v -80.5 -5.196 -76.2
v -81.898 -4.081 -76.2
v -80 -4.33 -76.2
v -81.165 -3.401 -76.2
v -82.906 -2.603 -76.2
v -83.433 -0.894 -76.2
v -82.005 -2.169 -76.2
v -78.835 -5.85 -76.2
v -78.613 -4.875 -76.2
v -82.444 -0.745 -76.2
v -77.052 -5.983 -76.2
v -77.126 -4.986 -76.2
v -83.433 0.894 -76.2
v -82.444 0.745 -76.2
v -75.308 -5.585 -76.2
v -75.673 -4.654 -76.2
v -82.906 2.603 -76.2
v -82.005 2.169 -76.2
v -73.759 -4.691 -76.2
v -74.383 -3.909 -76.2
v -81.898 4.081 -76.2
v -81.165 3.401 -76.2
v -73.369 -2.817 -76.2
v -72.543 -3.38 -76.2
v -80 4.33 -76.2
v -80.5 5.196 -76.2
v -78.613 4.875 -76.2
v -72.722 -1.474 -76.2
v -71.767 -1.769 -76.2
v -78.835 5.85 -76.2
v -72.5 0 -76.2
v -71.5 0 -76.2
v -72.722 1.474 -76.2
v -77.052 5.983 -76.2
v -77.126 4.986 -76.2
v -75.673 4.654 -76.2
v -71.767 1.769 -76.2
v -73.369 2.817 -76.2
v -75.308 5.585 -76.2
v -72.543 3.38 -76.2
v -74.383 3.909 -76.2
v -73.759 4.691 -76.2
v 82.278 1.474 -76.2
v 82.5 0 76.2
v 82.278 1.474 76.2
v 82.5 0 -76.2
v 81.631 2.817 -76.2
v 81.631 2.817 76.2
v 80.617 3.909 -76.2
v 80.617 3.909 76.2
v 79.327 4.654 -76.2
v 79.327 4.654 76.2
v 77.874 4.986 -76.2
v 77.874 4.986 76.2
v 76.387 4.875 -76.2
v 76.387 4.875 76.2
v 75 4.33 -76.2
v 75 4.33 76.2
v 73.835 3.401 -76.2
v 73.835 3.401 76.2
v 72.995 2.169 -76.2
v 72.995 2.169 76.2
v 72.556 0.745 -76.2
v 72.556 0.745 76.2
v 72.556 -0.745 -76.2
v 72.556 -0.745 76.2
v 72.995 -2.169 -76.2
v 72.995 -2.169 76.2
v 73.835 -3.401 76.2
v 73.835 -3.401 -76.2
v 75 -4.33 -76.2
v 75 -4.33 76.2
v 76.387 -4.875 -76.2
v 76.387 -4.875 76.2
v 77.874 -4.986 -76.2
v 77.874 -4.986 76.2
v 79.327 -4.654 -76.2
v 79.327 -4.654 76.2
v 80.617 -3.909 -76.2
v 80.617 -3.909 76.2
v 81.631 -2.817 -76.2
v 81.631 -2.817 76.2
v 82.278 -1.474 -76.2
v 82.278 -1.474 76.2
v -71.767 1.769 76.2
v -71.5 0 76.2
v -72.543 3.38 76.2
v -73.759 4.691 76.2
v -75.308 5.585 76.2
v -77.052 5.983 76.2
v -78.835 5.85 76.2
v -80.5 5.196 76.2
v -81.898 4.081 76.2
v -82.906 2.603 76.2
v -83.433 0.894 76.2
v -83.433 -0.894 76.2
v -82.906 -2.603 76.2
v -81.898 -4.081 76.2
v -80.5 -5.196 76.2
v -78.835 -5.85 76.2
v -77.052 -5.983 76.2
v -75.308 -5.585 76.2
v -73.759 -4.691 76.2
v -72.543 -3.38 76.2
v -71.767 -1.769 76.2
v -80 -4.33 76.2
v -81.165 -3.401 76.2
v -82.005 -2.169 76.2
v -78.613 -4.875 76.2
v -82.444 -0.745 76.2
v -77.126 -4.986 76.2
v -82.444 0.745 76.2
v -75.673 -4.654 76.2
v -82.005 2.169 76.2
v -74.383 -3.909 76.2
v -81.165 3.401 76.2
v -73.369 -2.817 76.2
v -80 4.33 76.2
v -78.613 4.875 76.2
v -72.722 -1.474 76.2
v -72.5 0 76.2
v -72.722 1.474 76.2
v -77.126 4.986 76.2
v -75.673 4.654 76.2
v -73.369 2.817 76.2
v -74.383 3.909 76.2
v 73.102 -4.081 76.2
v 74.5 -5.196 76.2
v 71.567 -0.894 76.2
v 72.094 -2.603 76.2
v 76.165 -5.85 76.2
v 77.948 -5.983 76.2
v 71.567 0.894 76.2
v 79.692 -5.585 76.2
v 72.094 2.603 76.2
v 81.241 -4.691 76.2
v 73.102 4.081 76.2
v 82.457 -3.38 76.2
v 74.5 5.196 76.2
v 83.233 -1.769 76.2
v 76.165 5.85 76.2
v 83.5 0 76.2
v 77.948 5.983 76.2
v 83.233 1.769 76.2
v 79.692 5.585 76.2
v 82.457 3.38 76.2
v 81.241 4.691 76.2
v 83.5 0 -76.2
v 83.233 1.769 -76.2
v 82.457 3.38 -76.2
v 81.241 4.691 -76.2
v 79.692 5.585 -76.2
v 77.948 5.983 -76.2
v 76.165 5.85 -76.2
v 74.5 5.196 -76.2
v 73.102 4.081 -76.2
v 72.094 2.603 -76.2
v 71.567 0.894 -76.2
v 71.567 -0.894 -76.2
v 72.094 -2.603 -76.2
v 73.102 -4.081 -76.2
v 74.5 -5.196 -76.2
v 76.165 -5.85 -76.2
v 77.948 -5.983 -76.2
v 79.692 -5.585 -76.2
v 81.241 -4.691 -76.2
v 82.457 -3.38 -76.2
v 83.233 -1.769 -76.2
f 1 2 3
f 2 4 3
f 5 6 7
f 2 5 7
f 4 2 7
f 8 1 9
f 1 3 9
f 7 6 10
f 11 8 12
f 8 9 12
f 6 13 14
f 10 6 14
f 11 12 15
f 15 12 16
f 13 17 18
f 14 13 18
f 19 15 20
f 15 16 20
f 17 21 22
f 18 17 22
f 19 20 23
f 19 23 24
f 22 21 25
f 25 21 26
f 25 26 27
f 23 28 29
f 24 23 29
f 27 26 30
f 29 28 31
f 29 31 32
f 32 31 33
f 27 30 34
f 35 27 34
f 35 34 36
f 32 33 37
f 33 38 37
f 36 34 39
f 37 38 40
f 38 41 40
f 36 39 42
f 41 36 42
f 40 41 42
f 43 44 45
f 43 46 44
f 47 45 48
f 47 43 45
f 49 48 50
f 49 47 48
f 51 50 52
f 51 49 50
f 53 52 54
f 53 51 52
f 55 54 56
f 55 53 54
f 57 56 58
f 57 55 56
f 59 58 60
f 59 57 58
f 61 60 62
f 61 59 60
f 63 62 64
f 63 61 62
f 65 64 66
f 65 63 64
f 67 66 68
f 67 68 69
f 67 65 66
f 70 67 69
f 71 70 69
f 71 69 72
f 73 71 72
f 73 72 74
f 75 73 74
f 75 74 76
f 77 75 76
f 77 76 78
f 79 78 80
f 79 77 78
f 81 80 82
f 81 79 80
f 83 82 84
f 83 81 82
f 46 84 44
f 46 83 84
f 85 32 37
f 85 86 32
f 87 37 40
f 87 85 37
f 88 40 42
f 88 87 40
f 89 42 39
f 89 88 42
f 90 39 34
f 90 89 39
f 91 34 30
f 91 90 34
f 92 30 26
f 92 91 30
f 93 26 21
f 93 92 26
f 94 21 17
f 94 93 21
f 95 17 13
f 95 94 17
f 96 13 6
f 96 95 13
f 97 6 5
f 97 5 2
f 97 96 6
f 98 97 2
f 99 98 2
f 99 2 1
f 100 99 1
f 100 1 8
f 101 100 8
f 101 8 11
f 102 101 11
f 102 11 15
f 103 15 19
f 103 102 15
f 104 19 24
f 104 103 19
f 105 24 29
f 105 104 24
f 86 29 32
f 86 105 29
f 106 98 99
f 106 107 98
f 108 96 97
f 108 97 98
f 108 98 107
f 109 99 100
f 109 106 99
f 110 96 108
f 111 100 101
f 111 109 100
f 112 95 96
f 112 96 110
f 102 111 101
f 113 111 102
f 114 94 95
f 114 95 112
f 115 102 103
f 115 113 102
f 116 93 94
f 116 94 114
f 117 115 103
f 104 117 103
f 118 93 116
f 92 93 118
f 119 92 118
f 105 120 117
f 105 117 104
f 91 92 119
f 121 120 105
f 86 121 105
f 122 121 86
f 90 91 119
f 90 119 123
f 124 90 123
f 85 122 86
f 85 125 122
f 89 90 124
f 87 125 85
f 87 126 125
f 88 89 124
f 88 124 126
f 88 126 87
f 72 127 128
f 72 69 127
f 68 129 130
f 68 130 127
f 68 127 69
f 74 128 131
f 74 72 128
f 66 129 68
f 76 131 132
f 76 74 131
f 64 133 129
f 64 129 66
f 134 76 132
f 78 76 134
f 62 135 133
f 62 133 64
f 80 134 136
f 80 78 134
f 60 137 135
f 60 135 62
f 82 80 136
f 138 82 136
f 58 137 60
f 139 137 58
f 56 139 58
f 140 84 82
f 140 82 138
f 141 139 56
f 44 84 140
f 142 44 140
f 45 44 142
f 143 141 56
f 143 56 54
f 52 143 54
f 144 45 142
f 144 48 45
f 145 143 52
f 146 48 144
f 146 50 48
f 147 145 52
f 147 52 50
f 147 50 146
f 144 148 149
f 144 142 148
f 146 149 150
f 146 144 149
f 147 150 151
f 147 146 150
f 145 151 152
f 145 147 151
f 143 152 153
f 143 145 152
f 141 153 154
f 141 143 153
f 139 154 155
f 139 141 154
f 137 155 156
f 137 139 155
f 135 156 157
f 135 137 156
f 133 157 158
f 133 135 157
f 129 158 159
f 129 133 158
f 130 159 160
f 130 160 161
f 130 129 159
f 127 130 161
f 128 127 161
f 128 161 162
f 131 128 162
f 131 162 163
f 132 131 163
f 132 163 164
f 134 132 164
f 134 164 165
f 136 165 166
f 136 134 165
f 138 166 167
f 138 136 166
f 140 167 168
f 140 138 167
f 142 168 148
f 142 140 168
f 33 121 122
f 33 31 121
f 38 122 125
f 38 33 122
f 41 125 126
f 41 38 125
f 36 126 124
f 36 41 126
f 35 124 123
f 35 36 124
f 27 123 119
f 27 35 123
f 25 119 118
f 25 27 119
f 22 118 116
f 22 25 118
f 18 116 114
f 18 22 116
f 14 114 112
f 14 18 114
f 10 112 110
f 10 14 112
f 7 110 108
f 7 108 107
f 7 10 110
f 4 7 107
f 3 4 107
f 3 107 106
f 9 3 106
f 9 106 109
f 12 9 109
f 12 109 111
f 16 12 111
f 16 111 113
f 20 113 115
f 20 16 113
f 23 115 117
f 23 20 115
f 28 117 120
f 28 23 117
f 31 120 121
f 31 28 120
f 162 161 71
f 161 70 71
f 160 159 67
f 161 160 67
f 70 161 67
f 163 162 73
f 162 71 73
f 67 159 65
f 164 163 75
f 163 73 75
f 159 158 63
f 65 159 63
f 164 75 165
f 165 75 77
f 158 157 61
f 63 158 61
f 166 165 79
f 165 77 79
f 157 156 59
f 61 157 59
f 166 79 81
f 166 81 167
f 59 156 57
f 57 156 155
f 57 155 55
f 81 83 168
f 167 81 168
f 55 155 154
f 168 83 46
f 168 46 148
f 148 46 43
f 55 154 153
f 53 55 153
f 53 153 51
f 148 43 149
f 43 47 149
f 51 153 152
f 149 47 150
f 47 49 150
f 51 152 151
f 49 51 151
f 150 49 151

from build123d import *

# Parameters (mm, degrees)
SKETCH1_R             = 6
SKETCH1_R_2           = 5
BOSS_EXTRUDE1_DEPTH   = 76.2
BOSS_EXTRUDE1_2_DEPTH = 76.2


with BuildPart() as part:
    # Sketch1 → Boss-Extrude1 (new, symmetric)
    with BuildSketch(Plane.XY):
        with Locations((-77.5, 0)):
            Circle(SKETCH1_R)
        with Locations((-77.5, 0)):
            Circle(SKETCH1_R_2, mode=Mode.SUBTRACT)
    extrude(amount=BOSS_EXTRUDE1_DEPTH, both=True)


with BuildPart() as body_2:
    # Sketch1 → Boss-Extrude1 2 (new, symmetric)
    with BuildSketch(Plane.XY):
        with Locations((77.5, 0)):
            Circle(SKETCH1_R)
        with Locations((77.5, 0)):
            Circle(SKETCH1_R_2, mode=Mode.SUBTRACT)
    extrude(amount=BOSS_EXTRUDE1_2_DEPTH, both=True)


solid = Compound([part.part, body_2.part])
